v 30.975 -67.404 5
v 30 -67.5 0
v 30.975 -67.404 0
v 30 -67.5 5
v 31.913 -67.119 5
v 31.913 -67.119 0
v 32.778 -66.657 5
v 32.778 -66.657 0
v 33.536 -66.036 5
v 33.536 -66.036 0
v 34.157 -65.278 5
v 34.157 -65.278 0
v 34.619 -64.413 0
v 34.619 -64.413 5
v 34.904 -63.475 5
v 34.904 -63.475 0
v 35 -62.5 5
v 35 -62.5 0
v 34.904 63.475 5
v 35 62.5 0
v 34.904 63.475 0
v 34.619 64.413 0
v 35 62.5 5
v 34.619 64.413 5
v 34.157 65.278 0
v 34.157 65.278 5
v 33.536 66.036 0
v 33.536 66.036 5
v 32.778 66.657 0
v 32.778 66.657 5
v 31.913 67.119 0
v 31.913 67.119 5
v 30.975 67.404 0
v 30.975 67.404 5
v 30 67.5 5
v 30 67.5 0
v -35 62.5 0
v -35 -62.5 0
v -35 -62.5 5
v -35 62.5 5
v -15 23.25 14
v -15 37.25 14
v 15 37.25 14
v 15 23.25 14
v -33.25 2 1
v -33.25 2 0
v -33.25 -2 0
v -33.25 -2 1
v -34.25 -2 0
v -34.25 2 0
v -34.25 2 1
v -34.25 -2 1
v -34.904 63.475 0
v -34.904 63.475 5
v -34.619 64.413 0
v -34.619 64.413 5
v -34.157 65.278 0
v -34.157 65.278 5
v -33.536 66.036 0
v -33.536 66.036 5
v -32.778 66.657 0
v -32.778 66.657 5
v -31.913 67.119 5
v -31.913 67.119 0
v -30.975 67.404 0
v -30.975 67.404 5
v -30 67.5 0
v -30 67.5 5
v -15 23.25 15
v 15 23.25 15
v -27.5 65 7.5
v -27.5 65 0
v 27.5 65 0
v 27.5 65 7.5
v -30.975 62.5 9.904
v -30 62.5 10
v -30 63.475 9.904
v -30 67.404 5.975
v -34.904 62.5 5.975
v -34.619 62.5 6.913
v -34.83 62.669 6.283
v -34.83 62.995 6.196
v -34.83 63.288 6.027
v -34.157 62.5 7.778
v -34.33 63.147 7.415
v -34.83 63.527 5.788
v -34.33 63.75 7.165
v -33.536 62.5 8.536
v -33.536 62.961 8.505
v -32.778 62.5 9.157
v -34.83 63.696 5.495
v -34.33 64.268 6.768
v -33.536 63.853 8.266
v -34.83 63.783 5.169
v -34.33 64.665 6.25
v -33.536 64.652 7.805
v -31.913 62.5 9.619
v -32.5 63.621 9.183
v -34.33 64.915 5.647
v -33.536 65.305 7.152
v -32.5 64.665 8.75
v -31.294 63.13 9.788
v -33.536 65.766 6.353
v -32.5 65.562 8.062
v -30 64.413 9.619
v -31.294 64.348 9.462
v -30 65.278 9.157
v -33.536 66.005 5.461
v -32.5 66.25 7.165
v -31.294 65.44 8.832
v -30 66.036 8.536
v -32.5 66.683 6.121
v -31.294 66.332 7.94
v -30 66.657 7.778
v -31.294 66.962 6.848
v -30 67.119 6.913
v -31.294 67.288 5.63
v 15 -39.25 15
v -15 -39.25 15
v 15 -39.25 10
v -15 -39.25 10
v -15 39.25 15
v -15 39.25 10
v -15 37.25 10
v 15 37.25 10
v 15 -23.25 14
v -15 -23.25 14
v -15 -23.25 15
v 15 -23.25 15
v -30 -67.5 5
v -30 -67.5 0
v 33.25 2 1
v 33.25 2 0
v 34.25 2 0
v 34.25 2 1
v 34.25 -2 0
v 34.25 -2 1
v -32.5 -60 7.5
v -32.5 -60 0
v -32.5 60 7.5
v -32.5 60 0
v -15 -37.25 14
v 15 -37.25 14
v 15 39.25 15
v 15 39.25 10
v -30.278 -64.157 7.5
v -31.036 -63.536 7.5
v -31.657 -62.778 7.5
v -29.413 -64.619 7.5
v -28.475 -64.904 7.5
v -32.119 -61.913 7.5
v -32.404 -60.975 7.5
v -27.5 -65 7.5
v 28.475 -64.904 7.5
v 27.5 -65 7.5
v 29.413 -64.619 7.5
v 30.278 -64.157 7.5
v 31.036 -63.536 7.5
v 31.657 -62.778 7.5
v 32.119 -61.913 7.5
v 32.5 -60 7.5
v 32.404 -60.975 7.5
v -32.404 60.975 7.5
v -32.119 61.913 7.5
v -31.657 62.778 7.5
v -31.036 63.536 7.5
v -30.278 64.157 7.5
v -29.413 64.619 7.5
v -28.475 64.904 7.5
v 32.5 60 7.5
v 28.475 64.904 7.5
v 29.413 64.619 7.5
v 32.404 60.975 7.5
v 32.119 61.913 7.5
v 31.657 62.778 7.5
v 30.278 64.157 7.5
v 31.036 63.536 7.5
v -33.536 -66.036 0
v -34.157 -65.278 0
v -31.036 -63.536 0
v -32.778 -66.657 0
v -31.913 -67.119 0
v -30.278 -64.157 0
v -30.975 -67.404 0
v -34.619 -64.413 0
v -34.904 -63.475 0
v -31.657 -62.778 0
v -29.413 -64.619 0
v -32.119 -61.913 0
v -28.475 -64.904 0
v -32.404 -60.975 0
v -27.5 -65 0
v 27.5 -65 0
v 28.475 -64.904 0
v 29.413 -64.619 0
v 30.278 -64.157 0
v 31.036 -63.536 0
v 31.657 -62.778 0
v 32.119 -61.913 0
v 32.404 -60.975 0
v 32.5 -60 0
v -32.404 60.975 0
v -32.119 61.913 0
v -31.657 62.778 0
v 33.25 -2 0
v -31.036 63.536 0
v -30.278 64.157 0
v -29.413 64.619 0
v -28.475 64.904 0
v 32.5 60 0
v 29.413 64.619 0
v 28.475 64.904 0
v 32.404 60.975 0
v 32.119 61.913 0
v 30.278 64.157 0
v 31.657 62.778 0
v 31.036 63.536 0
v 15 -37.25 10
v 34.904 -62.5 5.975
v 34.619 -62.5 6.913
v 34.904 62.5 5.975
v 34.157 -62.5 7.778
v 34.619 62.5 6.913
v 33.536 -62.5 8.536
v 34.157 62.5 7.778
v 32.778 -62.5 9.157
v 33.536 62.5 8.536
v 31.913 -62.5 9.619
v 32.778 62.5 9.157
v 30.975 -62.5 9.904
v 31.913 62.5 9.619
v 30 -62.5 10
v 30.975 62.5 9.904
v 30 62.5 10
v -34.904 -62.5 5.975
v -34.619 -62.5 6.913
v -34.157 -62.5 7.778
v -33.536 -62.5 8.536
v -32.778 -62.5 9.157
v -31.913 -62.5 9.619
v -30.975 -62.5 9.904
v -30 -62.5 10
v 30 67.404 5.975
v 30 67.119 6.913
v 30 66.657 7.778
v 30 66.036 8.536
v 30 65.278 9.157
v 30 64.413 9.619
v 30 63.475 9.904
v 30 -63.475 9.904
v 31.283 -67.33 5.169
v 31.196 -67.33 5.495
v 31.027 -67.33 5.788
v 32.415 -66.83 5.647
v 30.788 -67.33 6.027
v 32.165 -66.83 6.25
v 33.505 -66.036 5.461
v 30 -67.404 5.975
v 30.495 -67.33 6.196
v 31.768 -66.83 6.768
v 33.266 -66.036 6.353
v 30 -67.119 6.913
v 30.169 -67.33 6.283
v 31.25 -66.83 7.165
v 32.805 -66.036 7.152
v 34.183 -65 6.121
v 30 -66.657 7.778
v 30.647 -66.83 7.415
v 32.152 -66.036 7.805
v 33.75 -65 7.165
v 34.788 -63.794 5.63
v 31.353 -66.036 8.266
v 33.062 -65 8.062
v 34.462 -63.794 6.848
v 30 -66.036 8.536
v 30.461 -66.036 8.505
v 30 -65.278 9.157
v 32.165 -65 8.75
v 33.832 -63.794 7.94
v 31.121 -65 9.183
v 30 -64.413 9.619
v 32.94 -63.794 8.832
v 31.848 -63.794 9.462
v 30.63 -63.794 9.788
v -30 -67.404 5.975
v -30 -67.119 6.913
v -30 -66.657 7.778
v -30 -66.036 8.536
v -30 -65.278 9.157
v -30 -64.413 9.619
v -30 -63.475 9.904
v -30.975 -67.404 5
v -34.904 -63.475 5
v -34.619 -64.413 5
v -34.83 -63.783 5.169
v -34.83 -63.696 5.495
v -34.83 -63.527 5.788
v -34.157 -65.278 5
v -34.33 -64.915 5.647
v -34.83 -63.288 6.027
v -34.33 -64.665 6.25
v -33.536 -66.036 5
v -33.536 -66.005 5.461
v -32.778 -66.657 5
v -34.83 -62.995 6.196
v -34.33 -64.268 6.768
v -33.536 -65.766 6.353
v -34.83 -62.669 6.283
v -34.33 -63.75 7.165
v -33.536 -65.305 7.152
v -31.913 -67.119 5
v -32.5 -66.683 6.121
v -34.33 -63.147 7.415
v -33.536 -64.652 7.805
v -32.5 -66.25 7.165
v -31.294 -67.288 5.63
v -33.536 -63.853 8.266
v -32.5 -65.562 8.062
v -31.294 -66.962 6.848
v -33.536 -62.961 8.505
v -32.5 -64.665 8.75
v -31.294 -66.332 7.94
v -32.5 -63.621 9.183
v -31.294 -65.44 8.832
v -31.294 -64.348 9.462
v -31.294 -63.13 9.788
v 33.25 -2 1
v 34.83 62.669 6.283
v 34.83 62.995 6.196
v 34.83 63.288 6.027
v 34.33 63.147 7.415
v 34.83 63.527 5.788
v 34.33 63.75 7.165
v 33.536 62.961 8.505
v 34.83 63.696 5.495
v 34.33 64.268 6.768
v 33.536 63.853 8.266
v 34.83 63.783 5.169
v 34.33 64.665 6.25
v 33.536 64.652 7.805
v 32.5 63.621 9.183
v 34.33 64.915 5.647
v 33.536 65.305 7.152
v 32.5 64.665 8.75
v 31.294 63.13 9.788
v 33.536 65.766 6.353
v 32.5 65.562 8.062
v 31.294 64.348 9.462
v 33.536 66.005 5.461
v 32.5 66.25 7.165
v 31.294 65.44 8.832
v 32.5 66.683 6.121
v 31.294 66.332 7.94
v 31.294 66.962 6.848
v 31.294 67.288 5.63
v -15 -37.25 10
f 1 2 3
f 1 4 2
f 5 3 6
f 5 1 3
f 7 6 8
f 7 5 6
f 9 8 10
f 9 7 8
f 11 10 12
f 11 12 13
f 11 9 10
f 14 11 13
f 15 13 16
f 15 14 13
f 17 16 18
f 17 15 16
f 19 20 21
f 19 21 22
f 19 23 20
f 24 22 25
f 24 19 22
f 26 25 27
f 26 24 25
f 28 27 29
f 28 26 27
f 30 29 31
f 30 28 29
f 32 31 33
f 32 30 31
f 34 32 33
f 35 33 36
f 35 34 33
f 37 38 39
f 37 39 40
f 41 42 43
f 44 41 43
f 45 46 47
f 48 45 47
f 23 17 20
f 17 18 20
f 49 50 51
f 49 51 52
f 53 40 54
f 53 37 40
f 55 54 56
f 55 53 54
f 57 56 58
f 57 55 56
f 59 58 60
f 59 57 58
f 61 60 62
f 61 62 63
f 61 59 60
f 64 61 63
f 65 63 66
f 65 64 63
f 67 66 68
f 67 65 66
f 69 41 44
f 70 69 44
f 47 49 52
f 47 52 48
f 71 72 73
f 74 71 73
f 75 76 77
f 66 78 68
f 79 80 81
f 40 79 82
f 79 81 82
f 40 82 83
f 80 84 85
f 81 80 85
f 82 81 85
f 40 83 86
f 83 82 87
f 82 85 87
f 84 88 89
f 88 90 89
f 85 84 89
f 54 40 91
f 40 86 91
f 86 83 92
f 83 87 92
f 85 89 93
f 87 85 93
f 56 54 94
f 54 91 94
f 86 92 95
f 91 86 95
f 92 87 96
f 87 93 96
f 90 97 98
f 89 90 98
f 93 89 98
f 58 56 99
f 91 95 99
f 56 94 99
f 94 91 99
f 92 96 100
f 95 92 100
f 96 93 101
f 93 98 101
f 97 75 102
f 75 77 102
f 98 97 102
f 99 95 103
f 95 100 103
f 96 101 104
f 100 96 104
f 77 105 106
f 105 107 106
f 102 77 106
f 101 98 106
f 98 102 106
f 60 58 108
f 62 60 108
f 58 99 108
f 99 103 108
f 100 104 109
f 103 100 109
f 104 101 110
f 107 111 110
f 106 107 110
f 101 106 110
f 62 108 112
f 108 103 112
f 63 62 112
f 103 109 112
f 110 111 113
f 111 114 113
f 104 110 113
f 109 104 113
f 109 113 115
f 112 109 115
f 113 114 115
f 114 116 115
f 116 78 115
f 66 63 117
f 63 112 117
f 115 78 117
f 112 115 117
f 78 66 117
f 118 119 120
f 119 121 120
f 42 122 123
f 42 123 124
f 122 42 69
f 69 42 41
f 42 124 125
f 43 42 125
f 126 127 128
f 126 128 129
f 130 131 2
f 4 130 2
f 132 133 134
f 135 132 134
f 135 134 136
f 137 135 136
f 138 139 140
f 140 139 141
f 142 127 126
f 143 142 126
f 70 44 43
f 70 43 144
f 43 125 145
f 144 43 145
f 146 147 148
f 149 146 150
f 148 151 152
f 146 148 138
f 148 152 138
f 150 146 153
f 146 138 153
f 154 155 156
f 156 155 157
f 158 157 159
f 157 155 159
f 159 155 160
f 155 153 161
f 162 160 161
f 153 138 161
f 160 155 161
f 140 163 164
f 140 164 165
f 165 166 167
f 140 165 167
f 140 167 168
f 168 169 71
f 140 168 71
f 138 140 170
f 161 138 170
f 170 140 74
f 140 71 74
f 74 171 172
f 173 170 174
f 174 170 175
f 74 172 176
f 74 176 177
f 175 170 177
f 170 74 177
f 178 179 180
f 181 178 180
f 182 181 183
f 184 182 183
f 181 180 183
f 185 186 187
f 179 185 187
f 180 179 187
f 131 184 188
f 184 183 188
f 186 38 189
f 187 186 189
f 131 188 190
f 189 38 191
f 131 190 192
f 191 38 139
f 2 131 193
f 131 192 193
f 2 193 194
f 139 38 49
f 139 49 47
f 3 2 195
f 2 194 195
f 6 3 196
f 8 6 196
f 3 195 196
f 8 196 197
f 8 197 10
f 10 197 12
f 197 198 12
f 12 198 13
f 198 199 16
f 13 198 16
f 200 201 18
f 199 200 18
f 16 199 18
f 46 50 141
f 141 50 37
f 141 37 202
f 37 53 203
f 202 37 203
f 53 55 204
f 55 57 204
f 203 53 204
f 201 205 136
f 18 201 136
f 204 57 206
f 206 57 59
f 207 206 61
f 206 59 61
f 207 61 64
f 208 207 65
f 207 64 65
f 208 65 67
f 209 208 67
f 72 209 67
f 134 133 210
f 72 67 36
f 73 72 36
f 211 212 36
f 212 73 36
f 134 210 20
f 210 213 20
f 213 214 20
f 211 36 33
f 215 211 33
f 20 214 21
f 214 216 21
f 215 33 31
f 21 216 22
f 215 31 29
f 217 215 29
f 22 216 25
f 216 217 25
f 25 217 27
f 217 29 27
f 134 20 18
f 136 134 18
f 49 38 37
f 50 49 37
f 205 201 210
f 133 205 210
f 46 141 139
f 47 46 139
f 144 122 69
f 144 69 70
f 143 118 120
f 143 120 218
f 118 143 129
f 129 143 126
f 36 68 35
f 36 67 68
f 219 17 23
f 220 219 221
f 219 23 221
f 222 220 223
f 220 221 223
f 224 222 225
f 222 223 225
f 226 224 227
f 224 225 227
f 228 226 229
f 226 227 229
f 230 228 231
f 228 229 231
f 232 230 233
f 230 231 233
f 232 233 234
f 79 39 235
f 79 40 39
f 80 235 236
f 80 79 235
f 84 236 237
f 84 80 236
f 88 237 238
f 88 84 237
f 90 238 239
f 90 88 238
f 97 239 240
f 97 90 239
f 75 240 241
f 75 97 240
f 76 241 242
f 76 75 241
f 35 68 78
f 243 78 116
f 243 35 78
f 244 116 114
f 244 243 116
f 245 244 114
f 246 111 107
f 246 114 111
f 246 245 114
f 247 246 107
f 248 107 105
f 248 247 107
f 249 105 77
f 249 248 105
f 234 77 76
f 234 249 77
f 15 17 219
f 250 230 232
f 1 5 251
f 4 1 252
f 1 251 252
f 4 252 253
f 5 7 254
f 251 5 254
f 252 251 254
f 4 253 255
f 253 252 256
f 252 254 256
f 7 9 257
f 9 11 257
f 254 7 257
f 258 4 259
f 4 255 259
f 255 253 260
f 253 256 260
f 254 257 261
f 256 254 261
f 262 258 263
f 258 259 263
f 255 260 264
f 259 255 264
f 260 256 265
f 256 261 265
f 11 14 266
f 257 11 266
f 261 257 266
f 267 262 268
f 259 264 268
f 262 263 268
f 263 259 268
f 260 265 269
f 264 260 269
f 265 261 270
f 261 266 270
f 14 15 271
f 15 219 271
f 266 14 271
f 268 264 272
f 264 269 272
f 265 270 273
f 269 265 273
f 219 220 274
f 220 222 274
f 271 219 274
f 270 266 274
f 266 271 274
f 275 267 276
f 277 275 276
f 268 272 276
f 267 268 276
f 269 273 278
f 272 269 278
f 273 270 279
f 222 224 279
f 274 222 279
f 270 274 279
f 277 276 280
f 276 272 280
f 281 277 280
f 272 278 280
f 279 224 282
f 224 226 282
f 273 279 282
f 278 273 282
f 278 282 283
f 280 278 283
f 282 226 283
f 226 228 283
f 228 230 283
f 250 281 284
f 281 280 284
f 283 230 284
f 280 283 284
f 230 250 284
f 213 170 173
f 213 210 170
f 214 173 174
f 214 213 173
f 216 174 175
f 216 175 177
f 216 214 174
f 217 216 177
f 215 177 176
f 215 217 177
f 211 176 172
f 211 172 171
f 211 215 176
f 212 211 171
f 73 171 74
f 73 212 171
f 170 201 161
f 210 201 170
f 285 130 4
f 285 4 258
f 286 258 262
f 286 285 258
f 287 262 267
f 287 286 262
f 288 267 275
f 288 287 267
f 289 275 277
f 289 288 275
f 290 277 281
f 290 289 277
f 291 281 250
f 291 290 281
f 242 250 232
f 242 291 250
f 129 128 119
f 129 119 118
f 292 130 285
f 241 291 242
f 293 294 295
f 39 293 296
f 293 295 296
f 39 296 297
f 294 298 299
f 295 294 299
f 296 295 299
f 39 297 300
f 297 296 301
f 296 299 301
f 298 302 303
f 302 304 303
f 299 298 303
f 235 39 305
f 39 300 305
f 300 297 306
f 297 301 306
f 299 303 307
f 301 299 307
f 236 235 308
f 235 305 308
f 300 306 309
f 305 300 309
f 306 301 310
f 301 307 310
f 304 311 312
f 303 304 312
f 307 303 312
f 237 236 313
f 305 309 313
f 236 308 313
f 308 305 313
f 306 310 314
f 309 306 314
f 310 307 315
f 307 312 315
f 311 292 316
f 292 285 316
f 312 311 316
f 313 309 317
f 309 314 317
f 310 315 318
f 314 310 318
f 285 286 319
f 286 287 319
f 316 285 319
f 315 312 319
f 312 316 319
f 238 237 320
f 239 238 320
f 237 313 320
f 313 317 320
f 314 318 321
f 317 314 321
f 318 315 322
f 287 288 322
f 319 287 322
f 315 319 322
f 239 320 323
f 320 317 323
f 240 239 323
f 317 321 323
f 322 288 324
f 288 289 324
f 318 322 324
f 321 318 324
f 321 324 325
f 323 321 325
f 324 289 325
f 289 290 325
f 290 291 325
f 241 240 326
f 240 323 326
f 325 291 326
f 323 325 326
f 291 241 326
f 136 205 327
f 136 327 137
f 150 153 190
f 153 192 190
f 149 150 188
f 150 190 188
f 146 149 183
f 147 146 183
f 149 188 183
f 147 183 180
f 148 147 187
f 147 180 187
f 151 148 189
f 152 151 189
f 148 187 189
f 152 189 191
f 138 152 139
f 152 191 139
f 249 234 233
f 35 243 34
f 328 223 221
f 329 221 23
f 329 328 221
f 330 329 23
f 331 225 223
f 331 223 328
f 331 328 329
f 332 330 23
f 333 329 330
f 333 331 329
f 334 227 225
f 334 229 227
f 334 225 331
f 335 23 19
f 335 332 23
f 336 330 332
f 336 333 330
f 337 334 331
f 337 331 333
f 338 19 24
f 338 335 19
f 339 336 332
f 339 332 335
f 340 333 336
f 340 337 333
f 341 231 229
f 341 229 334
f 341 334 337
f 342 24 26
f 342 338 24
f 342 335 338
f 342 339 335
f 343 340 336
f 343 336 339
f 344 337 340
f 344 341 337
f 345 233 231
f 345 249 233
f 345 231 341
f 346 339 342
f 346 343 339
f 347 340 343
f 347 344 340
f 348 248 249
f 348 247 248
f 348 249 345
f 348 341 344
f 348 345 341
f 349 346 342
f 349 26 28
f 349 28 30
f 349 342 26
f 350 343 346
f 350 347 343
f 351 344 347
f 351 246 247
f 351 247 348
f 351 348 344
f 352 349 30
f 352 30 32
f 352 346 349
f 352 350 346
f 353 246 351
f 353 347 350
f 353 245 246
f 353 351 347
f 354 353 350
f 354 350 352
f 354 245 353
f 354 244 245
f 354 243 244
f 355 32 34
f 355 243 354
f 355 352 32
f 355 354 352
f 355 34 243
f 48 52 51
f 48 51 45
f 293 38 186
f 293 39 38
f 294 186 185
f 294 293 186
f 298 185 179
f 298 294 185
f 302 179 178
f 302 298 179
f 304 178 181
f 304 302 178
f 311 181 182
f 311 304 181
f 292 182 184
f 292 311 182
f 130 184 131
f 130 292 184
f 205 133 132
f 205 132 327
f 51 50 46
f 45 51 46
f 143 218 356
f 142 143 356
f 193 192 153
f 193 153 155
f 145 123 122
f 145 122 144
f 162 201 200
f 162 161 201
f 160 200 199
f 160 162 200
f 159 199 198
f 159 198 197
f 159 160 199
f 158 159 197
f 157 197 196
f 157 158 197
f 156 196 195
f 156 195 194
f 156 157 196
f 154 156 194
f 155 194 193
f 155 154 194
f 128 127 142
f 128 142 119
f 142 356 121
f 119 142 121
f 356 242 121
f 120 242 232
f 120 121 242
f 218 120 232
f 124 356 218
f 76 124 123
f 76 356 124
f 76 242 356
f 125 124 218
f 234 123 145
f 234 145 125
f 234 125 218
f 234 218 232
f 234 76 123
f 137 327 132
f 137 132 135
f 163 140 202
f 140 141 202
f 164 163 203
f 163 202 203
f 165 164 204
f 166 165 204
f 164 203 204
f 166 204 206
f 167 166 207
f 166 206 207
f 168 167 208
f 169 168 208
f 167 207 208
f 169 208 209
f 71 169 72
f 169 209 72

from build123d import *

# Parameters (mm, degrees)
F0_W      = 70
F0_H      = 135
F1_DEPTH  = 10
F2_T      = -2.5
F3_R      = 5
F4_R      = 5
F5_R      = 5
F6_R      = 5
F7_W      = 1
F7_H      = 4
F8_DEPTH  = 1
F9_W      = 30
F9_H      = 2
F9_W_2    = 15
F10_DEPTH = 4
F12_W     = 30
F12_H     = 14
F12_H_2   = 2
F13_DEPTH = 1
F11_W     = 30
F11_H     = 2
F11_H_2   = 14
F14_DEPTH = 1


with BuildPart() as f1:
    # F0 (on Top) → F1 (new body)
    with BuildSketch(Plane.XY):
        Rectangle(F0_W, F0_H)
    extrude(amount=F1_DEPTH)

    # F2
    f2_openings = [f1.faces().sort_by_distance(p)[0] for p in [
        (0, 0, 0),
    ]]
    offset(amount=F2_T, openings=f2_openings)

    # F3
    f3_edges = [f1.edges().sort_by_distance(p)[0] for p in [
        (0, 67.5, 10),
        (35, 0, 10),
        (35, 67.5, 5),
    ]]
    fillet(f3_edges, radius=F3_R)

    # F4
    f4_edges = [f1.edges().sort_by_distance(p)[0] for p in [
        (33.535534, -67.5, 8.535534),
        (-2.5, -67.5, 10),
    ]]
    fillet(f4_edges, radius=F4_R)

    # F5
    f5_edges = [f1.edges().sort_by_distance(p)[0] for p in [
        (-35, 0, 10),
        (-35, -66.035534, 8.535534),
    ]]
    fillet(f5_edges, radius=F5_R)

    # F6
    f6_edges = [f1.edges().sort_by_distance(p)[0] for p in [
        (32.5, 65, 3.75),
        (-32.5, 65, 3.75),
        (32.5, -65, 3.75),
        (-32.5, -65, 3.75),
    ]]
    fillet(f6_edges, radius=F6_R)

    # F7 (on face) → F8 (cut)
    with BuildSketch(Plane(origin=(0, 0, 0), x_dir=(1, 0, 0), z_dir=(0, 0, -1))):
        with Locations((-33.75, 0)):
            Rectangle(F7_W, F7_H)
        with Locations((33.75, 0)):
            Rectangle(F7_W, F7_H)
    extrude(amount=-F8_DEPTH, mode=Mode.SUBTRACT)

    # F9 (on face) → F10 (join)
    with BuildSketch(Plane.XY.offset(10)):
        with Locations((0, 38.25)):
            Rectangle(F9_W, F9_H)
        with Locations((-7.5, -38.25)):
            Rectangle(F9_W_2, F9_H)
        with Locations((7.5, -38.25)):
            Rectangle(F9_W_2, F9_H)
    extrude(amount=F10_DEPTH)

    # F12 (on face) → F13 (join)
    with BuildSketch(Plane.XY.offset(14)):
        with Locations((0, -30.25)):
            Rectangle(F12_W, F12_H)
        with Locations((0, -38.25)):
            Rectangle(F12_W, F12_H_2)
    extrude(amount=F13_DEPTH)

    # F11 (on face) → F14 (join)
    with BuildSketch(Plane.XY.offset(14)):
        with Locations((0, 38.25)):
            Rectangle(F11_W, F11_H)
        with Locations((0, 30.25)):
            Rectangle(F11_W, F11_H_2)
    extrude(amount=F14_DEPTH)


solid = f1.part
